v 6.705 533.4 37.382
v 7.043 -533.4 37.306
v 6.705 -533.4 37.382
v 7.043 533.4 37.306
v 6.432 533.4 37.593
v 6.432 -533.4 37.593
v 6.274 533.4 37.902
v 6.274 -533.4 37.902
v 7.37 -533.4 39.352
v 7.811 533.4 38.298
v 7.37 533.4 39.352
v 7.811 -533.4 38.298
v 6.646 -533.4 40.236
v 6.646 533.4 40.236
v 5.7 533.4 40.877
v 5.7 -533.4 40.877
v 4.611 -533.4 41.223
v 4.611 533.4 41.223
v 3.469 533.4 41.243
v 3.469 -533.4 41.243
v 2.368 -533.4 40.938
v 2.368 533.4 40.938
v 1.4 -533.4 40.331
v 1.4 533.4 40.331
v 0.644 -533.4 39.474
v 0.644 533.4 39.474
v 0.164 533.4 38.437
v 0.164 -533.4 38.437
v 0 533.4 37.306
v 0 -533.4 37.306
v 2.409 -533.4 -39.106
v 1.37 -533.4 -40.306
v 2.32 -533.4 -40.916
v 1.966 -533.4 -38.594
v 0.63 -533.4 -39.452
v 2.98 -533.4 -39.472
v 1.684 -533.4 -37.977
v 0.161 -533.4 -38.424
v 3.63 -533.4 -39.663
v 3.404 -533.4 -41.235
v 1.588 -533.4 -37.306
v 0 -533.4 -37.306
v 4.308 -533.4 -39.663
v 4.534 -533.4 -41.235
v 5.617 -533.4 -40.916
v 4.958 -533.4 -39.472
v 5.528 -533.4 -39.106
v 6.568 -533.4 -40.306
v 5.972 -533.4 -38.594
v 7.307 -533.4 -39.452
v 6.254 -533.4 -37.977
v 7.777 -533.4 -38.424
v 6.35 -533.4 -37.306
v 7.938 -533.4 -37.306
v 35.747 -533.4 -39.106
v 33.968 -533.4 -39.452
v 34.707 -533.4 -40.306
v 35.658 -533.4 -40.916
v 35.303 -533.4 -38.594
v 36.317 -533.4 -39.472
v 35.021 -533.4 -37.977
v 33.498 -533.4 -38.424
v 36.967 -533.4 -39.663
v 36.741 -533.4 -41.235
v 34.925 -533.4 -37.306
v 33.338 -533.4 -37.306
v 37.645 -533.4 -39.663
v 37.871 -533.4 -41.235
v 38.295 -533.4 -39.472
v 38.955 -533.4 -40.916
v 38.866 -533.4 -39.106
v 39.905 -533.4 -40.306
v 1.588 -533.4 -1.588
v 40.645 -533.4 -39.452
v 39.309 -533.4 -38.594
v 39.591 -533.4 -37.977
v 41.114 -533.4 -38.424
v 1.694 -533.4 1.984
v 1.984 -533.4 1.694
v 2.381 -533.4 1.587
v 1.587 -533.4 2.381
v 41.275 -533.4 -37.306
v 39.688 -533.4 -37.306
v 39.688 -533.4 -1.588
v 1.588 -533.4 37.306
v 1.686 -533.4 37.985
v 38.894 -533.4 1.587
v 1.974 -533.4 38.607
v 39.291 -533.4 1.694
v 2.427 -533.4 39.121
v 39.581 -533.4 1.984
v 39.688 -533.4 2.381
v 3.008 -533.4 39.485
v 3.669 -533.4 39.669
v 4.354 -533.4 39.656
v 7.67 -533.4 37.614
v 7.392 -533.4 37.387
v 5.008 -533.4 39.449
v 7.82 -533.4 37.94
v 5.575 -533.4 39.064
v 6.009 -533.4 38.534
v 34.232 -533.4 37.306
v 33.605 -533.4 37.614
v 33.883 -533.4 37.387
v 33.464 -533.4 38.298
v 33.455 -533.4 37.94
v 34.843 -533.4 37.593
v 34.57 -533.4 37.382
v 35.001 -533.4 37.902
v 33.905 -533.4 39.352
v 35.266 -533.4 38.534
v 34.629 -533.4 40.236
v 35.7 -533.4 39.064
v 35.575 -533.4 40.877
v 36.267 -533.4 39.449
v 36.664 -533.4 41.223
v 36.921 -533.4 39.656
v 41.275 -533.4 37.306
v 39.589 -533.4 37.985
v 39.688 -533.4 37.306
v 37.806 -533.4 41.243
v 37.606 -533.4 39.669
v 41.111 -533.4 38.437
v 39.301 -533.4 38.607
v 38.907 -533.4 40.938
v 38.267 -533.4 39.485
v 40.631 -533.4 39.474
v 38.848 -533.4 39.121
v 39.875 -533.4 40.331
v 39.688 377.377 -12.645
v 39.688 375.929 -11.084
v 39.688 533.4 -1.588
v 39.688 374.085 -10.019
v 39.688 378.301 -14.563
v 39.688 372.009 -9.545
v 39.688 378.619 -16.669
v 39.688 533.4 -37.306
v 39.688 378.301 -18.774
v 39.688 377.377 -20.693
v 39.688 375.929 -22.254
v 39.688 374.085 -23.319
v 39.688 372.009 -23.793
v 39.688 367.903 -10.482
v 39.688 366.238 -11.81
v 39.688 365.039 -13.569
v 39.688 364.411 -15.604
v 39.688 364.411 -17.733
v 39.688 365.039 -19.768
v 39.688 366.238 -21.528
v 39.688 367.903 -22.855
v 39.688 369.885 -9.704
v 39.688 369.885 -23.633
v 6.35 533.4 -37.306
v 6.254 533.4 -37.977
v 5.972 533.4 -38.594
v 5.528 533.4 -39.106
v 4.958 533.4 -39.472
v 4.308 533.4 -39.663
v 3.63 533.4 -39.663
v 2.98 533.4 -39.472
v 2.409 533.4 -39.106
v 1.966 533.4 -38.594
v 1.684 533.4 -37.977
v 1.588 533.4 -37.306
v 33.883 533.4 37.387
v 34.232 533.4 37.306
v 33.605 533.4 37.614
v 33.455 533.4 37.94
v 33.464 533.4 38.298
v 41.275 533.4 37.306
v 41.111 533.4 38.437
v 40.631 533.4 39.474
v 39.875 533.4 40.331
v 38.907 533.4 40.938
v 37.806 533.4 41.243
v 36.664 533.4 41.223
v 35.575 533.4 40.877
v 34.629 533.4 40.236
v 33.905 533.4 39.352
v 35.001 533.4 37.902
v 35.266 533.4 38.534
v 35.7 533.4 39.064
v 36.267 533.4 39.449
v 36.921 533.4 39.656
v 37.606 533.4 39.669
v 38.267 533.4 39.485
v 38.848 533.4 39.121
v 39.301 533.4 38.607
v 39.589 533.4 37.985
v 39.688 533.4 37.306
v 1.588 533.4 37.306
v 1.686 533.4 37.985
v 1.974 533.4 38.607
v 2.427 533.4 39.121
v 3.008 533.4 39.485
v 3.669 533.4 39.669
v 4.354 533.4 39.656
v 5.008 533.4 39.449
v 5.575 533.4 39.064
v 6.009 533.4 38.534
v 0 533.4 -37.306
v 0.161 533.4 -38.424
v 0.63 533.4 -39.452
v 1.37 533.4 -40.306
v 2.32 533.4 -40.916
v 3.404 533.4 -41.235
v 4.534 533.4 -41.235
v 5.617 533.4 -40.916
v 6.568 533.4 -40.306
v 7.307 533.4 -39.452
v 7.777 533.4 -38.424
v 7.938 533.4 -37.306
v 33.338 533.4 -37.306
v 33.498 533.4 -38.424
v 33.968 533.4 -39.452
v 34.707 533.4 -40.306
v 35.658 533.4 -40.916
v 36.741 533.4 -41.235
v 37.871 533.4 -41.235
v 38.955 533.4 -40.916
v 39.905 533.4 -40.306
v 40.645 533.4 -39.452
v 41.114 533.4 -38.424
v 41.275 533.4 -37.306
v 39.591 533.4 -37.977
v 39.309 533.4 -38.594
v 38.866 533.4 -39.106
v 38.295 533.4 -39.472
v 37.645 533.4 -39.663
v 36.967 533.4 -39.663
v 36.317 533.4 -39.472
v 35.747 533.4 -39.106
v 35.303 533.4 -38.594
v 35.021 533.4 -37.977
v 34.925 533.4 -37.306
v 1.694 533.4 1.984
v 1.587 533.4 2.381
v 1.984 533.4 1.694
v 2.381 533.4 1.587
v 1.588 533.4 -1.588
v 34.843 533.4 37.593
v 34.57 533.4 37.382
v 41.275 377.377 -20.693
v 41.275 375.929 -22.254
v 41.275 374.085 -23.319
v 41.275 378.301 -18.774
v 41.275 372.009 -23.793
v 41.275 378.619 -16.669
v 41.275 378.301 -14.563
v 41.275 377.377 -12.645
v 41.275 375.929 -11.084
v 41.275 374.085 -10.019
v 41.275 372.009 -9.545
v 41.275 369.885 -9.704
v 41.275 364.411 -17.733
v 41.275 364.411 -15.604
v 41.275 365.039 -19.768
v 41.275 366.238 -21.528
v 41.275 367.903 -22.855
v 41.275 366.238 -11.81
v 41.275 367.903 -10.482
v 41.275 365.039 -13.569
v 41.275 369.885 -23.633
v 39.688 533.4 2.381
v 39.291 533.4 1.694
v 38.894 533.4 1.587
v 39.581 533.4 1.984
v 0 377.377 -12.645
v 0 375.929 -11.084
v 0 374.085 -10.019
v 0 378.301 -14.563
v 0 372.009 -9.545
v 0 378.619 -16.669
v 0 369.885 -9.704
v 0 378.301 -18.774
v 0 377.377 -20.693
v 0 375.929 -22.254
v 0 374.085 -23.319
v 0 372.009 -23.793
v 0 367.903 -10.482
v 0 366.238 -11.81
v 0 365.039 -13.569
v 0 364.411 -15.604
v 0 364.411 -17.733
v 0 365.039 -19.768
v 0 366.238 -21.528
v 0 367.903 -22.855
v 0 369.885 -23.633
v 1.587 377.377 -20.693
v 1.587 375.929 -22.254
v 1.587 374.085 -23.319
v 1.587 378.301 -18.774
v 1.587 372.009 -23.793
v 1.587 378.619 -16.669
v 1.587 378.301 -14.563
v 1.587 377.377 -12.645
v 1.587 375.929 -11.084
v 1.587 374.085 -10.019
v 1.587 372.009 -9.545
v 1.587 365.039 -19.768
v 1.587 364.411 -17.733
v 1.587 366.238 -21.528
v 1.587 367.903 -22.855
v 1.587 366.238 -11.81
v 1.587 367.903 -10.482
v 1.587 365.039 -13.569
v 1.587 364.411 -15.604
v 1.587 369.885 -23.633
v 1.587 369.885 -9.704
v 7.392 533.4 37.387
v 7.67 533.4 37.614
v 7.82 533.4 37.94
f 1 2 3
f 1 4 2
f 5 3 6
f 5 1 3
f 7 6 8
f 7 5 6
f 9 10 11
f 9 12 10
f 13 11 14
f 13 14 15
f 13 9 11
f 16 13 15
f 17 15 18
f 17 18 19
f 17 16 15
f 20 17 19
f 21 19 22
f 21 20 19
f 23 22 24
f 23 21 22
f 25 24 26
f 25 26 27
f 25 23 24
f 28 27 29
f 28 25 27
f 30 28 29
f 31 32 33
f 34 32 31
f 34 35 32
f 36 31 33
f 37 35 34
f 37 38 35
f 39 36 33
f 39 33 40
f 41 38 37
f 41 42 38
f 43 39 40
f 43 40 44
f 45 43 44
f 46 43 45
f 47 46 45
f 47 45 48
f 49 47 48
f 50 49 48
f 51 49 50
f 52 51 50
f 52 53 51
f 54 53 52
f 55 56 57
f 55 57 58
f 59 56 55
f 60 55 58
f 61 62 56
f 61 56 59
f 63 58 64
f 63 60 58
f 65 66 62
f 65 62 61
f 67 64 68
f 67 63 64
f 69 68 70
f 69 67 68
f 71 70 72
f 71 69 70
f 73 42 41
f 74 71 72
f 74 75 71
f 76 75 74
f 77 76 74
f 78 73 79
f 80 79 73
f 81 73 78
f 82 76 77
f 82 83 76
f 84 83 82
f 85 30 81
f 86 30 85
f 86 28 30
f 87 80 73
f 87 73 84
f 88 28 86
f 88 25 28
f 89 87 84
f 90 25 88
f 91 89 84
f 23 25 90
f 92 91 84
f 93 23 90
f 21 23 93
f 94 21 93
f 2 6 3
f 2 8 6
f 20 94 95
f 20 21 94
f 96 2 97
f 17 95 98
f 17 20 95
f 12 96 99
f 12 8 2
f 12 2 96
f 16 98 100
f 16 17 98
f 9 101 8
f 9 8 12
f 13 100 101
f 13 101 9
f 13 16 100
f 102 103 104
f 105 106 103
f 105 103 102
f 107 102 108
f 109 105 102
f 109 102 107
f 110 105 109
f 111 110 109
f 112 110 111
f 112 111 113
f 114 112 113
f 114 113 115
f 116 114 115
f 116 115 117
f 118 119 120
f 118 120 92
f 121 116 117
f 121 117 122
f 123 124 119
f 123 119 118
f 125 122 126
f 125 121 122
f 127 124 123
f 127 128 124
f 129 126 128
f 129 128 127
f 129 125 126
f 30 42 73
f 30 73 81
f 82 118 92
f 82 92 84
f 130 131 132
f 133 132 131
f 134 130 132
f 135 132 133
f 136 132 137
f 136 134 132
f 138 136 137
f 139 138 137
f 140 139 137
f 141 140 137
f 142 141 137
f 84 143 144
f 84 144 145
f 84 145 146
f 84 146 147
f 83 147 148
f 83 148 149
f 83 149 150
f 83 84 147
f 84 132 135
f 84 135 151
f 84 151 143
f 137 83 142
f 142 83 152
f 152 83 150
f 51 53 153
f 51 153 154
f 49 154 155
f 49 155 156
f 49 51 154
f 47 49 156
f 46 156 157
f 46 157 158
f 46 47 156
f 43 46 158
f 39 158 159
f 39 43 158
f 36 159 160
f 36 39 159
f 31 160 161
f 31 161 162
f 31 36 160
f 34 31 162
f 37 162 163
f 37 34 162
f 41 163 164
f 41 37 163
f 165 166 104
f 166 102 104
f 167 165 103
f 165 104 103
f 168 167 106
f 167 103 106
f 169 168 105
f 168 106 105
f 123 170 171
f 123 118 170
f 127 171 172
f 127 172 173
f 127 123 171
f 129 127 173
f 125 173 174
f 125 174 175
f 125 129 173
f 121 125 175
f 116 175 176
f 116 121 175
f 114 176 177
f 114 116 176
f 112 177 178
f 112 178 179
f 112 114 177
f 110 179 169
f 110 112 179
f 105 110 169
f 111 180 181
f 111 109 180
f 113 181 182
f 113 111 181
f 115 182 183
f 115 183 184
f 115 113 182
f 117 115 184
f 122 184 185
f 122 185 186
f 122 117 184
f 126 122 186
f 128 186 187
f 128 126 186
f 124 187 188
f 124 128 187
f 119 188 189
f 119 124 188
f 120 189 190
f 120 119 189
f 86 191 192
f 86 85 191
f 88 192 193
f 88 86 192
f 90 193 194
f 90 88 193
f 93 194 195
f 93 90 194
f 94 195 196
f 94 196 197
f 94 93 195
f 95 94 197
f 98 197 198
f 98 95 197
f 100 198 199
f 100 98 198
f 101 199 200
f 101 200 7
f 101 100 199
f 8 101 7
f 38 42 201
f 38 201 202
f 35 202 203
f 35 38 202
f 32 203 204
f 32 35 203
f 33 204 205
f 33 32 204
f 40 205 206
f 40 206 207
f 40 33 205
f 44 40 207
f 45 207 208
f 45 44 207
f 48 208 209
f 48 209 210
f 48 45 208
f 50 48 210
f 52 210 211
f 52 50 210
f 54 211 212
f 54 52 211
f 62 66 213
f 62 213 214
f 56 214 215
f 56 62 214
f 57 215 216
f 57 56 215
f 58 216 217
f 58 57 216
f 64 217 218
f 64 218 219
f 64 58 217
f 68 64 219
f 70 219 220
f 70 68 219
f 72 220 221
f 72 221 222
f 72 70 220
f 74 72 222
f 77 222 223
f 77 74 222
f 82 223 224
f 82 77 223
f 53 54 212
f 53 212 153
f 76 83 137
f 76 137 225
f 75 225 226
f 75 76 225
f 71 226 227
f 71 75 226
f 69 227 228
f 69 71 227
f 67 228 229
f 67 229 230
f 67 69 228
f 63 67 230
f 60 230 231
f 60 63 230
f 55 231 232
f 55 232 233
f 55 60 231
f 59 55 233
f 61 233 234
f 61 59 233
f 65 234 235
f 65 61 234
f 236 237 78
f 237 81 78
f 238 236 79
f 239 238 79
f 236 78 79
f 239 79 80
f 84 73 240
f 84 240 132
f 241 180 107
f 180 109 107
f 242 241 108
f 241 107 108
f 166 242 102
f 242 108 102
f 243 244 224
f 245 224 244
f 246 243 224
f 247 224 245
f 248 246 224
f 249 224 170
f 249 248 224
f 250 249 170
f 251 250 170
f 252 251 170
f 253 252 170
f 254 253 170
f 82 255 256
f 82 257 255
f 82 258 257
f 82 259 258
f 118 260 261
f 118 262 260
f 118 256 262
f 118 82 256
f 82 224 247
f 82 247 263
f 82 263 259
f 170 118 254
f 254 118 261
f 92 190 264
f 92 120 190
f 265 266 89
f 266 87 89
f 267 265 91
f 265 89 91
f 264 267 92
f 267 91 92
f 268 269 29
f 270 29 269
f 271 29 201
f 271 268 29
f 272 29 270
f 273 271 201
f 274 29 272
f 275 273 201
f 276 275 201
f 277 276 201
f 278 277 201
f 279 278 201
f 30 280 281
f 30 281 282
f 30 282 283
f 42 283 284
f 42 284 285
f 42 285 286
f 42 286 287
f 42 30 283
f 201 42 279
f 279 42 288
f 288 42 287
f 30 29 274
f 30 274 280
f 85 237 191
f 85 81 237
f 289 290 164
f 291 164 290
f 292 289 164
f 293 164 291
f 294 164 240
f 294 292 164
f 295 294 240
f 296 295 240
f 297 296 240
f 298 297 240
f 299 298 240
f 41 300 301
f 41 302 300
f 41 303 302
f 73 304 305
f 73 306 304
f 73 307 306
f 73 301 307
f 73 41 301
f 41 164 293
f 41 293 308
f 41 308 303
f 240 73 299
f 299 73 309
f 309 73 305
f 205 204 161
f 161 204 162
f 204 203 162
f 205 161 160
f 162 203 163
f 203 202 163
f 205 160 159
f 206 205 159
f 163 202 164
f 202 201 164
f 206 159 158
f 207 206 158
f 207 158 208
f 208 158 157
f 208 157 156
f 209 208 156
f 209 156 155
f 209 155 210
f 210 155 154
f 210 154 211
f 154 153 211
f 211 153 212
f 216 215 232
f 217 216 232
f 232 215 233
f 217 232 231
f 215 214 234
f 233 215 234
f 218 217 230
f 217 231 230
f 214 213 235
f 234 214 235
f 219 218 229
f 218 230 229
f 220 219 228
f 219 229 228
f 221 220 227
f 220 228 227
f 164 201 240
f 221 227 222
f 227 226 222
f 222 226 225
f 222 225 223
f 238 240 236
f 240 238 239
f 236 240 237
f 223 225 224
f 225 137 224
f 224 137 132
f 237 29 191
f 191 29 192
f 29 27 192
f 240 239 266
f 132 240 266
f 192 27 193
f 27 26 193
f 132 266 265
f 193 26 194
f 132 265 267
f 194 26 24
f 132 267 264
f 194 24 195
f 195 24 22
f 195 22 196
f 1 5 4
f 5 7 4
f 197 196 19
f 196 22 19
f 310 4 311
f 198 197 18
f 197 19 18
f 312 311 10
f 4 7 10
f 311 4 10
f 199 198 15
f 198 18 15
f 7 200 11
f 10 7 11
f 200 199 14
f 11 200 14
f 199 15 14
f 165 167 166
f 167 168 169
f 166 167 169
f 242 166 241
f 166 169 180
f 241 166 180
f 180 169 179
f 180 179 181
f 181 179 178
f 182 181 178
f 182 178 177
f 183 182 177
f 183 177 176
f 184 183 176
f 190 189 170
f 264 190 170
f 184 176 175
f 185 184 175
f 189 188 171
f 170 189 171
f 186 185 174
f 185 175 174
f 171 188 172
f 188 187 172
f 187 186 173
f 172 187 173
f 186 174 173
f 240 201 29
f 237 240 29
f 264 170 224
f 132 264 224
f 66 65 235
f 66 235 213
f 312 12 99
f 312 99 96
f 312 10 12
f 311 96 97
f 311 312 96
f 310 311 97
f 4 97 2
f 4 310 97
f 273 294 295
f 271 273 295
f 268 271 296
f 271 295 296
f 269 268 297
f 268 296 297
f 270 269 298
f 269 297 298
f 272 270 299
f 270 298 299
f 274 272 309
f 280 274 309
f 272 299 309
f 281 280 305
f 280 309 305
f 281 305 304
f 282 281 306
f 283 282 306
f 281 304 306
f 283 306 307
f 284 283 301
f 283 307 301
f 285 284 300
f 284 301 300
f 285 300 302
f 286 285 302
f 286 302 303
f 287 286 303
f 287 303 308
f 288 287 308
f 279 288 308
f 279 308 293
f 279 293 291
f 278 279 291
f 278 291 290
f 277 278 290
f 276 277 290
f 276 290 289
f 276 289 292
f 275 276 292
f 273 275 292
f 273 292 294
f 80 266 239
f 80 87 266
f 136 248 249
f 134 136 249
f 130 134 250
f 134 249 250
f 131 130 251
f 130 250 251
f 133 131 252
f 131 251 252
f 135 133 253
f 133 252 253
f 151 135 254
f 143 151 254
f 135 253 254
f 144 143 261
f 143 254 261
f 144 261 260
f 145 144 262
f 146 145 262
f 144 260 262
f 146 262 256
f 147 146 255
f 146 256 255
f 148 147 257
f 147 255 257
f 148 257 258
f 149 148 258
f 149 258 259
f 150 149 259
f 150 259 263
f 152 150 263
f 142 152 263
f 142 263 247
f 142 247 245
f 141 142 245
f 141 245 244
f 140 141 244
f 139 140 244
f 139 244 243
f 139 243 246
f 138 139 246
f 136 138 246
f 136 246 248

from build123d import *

# Parameters (mm, degrees)
F1_DEPTH = 533.4
F2_R     = 0.79374
F3_R     = 7.14375
F4_DEPTH = 41.276


# Not quite as in the source:
# - a fillet or chamfer is up to 0.001 mm smaller than in the source, because OpenCascade refuses the exact size


with BuildPart() as f1:
    # F0 (on Front) → F1 (new body, symmetric)
    with BuildSketch(Plane.XZ):
        with BuildLine():
            Line((0, 37.30625), (0, 0))
            Line((0, 0), (20.6375, 0))
            Line((20.6375, 0), (20.6375, 1.5875))
            Line((20.6375, 1.5875), (1.5875, 1.5875))
            Line((1.5875, 1.5875), (1.5875, 37.30625))
            ThreePointArc((1.5875, 37.30625), (3.96875, 39.6875), (6.35, 37.30625))
            Line((6.35, 37.30625), (7.9375, 37.30625))
            ThreePointArc((7.9375, 37.30625), (3.96875, 41.275), (0, 37.30625))
        make_face()
        with BuildLine():
            Line((20.6375, 0), (0, 0))
            Line((0, 0), (0, -37.30625))
            ThreePointArc((0, -37.30625), (3.96875, -41.275), (7.9375, -37.30625))
            Line((7.9375, -37.30625), (6.35, -37.30625))
            ThreePointArc((6.35, -37.30625), (3.96875, -39.6875), (1.5875, -37.30625))
            Line((1.5875, -37.30625), (1.5875, -1.5875))
            Line((1.5875, -1.5875), (20.6375, -1.5875))
            Line((20.6375, -1.5875), (20.6375, 0))
        make_face()
        with BuildLine():
            Line((20.6375, 1.5875), (20.6375, 0))
            Line((20.6375, 0), (41.275, 0))
            Line((41.275, 0), (41.275, 37.30625))
            ThreePointArc((41.275, 37.30625), (37.30625, 41.275), (33.3375, 37.30625))
            Line((33.3375, 37.30625), (34.925, 37.30625))
            ThreePointArc((34.925, 37.30625), (37.30625, 39.6875), (39.6875, 37.30625))
            Line((39.6875, 37.30625), (39.6875, 1.5875))
            Line((39.6875, 1.5875), (20.6375, 1.5875))
        make_face()
        with BuildLine():
            Line((41.275, 0), (20.6375, 0))
            Line((20.6375, 0), (20.6375, -1.5875))
            Line((20.6375, -1.5875), (39.6875, -1.5875))
            Line((39.6875, -1.5875), (39.6875, -37.30625))
            ThreePointArc((39.6875, -37.30625), (37.30625, -39.6875), (34.925, -37.30625))
            Line((34.925, -37.30625), (33.3375, -37.30625))
            ThreePointArc((33.3375, -37.30625), (37.30625, -41.275), (41.275, -37.30625))
            Line((41.275, -37.30625), (41.275, 0))
        make_face()
    extrude(amount=F1_DEPTH, both=True)

    # F2 (radius 0.79375 in the source; OpenCascade refuses exactly that, so slightly less here)
    f2_edges = [f1.edges().sort_by_distance(p)[0] for p in [
        (6.35, 0, 37.30625),
        (7.9375, 0, 37.30625),
        (33.3375, 0, 37.30625),
        (34.925, 0, 37.30625),
        (0, 0, 37.30625),
        (41.275, 0, 37.30625),
        (39.6875, 0, 1.5875),
        (1.5875, 0, 1.5875),
    ]]
    fillet(f2_edges, radius=F2_R)

    # F3 (on face) → F4 (cut, through all)
    with BuildSketch(Plane.YZ.offset(41.275)):
        with Locations((371.475, -16.66875)):
            Circle(F3_R)
    extrude(amount=-F4_DEPTH, mode=Mode.SUBTRACT)


solid = f1.part
